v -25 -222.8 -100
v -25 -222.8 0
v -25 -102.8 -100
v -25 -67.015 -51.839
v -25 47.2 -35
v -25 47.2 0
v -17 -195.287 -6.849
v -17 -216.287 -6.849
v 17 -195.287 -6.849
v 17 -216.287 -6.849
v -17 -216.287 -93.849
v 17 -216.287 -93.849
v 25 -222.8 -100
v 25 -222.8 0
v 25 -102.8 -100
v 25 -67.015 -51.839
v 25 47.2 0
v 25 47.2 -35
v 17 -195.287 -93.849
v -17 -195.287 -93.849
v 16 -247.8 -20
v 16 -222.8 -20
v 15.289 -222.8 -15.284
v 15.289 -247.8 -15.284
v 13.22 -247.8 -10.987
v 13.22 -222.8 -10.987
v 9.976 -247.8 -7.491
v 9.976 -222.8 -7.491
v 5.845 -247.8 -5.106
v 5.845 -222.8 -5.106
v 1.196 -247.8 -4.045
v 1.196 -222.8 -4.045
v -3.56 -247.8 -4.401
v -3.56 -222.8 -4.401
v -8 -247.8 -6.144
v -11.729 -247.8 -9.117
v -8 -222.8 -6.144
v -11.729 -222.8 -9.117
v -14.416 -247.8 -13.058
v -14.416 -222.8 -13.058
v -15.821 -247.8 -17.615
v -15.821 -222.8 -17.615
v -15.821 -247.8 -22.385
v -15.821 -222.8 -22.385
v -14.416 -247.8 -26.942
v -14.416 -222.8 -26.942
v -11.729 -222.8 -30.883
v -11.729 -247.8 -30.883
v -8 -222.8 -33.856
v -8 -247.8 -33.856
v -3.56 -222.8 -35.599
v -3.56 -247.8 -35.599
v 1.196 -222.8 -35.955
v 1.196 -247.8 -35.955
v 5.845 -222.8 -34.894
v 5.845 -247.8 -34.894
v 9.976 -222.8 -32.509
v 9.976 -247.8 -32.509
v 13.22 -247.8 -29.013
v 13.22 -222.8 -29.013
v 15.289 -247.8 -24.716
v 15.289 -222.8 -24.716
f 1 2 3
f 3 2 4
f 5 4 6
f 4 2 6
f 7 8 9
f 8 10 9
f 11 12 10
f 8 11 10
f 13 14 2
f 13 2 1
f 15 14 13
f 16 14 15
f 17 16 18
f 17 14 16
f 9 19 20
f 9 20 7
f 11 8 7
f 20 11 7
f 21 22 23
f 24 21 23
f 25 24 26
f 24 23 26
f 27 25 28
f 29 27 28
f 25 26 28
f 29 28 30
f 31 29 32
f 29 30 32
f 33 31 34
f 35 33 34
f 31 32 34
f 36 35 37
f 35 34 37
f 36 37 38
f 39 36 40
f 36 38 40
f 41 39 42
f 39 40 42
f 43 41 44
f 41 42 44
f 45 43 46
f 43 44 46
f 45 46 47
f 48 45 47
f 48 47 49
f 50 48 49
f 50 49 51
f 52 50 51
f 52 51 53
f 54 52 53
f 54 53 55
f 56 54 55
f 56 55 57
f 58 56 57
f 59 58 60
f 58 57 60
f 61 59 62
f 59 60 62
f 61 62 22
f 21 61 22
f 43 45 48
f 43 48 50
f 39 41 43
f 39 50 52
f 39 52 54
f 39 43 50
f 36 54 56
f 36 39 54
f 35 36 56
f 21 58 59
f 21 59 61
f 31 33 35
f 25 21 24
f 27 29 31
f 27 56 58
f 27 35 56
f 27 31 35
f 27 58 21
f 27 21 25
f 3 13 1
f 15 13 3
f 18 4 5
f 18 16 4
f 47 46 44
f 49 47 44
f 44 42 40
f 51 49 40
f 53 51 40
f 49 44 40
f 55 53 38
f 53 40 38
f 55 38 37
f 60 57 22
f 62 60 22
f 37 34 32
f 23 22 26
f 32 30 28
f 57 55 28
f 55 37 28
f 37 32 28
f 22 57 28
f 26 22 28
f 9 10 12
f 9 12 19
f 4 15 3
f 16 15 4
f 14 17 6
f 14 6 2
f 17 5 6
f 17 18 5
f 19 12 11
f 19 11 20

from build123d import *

# Parameters (mm, degrees)
F3_DEPTH = 25
F2_W     = 21
F2_H     = 87
F4_DEPTH = 17
F5_R     = 16
F6_DEPTH = 25


with BuildPart() as f3:
    # F1 (on Right) → F3 (new body, symmetric)
    with BuildSketch(Plane.YZ):
        Polygon((47.2, -35), (47.2, 0), (-222.8, 0), (-222.8, -100), (-102.8, -100), (-67.015476, -51.839146), align=None)
    extrude(amount=F3_DEPTH, both=True)


with BuildPart() as f4:
    # F2 (on Right) → F4 (new body, symmetric)
    with BuildSketch(Plane.YZ):
        with Locations((-205.787494, -50.348558)):
            Rectangle(F2_W, F2_H)
    extrude(amount=F4_DEPTH, both=True)


with BuildPart() as f6:
    # F5 (on face) → F6 (new body)
    with BuildSketch(Plane.XZ.offset(222.8)):
        with Locations((0, -20)):
            Circle(F5_R)
    extrude(amount=F6_DEPTH)


solid = Compound([f3.part, f4.part, f6.part])
